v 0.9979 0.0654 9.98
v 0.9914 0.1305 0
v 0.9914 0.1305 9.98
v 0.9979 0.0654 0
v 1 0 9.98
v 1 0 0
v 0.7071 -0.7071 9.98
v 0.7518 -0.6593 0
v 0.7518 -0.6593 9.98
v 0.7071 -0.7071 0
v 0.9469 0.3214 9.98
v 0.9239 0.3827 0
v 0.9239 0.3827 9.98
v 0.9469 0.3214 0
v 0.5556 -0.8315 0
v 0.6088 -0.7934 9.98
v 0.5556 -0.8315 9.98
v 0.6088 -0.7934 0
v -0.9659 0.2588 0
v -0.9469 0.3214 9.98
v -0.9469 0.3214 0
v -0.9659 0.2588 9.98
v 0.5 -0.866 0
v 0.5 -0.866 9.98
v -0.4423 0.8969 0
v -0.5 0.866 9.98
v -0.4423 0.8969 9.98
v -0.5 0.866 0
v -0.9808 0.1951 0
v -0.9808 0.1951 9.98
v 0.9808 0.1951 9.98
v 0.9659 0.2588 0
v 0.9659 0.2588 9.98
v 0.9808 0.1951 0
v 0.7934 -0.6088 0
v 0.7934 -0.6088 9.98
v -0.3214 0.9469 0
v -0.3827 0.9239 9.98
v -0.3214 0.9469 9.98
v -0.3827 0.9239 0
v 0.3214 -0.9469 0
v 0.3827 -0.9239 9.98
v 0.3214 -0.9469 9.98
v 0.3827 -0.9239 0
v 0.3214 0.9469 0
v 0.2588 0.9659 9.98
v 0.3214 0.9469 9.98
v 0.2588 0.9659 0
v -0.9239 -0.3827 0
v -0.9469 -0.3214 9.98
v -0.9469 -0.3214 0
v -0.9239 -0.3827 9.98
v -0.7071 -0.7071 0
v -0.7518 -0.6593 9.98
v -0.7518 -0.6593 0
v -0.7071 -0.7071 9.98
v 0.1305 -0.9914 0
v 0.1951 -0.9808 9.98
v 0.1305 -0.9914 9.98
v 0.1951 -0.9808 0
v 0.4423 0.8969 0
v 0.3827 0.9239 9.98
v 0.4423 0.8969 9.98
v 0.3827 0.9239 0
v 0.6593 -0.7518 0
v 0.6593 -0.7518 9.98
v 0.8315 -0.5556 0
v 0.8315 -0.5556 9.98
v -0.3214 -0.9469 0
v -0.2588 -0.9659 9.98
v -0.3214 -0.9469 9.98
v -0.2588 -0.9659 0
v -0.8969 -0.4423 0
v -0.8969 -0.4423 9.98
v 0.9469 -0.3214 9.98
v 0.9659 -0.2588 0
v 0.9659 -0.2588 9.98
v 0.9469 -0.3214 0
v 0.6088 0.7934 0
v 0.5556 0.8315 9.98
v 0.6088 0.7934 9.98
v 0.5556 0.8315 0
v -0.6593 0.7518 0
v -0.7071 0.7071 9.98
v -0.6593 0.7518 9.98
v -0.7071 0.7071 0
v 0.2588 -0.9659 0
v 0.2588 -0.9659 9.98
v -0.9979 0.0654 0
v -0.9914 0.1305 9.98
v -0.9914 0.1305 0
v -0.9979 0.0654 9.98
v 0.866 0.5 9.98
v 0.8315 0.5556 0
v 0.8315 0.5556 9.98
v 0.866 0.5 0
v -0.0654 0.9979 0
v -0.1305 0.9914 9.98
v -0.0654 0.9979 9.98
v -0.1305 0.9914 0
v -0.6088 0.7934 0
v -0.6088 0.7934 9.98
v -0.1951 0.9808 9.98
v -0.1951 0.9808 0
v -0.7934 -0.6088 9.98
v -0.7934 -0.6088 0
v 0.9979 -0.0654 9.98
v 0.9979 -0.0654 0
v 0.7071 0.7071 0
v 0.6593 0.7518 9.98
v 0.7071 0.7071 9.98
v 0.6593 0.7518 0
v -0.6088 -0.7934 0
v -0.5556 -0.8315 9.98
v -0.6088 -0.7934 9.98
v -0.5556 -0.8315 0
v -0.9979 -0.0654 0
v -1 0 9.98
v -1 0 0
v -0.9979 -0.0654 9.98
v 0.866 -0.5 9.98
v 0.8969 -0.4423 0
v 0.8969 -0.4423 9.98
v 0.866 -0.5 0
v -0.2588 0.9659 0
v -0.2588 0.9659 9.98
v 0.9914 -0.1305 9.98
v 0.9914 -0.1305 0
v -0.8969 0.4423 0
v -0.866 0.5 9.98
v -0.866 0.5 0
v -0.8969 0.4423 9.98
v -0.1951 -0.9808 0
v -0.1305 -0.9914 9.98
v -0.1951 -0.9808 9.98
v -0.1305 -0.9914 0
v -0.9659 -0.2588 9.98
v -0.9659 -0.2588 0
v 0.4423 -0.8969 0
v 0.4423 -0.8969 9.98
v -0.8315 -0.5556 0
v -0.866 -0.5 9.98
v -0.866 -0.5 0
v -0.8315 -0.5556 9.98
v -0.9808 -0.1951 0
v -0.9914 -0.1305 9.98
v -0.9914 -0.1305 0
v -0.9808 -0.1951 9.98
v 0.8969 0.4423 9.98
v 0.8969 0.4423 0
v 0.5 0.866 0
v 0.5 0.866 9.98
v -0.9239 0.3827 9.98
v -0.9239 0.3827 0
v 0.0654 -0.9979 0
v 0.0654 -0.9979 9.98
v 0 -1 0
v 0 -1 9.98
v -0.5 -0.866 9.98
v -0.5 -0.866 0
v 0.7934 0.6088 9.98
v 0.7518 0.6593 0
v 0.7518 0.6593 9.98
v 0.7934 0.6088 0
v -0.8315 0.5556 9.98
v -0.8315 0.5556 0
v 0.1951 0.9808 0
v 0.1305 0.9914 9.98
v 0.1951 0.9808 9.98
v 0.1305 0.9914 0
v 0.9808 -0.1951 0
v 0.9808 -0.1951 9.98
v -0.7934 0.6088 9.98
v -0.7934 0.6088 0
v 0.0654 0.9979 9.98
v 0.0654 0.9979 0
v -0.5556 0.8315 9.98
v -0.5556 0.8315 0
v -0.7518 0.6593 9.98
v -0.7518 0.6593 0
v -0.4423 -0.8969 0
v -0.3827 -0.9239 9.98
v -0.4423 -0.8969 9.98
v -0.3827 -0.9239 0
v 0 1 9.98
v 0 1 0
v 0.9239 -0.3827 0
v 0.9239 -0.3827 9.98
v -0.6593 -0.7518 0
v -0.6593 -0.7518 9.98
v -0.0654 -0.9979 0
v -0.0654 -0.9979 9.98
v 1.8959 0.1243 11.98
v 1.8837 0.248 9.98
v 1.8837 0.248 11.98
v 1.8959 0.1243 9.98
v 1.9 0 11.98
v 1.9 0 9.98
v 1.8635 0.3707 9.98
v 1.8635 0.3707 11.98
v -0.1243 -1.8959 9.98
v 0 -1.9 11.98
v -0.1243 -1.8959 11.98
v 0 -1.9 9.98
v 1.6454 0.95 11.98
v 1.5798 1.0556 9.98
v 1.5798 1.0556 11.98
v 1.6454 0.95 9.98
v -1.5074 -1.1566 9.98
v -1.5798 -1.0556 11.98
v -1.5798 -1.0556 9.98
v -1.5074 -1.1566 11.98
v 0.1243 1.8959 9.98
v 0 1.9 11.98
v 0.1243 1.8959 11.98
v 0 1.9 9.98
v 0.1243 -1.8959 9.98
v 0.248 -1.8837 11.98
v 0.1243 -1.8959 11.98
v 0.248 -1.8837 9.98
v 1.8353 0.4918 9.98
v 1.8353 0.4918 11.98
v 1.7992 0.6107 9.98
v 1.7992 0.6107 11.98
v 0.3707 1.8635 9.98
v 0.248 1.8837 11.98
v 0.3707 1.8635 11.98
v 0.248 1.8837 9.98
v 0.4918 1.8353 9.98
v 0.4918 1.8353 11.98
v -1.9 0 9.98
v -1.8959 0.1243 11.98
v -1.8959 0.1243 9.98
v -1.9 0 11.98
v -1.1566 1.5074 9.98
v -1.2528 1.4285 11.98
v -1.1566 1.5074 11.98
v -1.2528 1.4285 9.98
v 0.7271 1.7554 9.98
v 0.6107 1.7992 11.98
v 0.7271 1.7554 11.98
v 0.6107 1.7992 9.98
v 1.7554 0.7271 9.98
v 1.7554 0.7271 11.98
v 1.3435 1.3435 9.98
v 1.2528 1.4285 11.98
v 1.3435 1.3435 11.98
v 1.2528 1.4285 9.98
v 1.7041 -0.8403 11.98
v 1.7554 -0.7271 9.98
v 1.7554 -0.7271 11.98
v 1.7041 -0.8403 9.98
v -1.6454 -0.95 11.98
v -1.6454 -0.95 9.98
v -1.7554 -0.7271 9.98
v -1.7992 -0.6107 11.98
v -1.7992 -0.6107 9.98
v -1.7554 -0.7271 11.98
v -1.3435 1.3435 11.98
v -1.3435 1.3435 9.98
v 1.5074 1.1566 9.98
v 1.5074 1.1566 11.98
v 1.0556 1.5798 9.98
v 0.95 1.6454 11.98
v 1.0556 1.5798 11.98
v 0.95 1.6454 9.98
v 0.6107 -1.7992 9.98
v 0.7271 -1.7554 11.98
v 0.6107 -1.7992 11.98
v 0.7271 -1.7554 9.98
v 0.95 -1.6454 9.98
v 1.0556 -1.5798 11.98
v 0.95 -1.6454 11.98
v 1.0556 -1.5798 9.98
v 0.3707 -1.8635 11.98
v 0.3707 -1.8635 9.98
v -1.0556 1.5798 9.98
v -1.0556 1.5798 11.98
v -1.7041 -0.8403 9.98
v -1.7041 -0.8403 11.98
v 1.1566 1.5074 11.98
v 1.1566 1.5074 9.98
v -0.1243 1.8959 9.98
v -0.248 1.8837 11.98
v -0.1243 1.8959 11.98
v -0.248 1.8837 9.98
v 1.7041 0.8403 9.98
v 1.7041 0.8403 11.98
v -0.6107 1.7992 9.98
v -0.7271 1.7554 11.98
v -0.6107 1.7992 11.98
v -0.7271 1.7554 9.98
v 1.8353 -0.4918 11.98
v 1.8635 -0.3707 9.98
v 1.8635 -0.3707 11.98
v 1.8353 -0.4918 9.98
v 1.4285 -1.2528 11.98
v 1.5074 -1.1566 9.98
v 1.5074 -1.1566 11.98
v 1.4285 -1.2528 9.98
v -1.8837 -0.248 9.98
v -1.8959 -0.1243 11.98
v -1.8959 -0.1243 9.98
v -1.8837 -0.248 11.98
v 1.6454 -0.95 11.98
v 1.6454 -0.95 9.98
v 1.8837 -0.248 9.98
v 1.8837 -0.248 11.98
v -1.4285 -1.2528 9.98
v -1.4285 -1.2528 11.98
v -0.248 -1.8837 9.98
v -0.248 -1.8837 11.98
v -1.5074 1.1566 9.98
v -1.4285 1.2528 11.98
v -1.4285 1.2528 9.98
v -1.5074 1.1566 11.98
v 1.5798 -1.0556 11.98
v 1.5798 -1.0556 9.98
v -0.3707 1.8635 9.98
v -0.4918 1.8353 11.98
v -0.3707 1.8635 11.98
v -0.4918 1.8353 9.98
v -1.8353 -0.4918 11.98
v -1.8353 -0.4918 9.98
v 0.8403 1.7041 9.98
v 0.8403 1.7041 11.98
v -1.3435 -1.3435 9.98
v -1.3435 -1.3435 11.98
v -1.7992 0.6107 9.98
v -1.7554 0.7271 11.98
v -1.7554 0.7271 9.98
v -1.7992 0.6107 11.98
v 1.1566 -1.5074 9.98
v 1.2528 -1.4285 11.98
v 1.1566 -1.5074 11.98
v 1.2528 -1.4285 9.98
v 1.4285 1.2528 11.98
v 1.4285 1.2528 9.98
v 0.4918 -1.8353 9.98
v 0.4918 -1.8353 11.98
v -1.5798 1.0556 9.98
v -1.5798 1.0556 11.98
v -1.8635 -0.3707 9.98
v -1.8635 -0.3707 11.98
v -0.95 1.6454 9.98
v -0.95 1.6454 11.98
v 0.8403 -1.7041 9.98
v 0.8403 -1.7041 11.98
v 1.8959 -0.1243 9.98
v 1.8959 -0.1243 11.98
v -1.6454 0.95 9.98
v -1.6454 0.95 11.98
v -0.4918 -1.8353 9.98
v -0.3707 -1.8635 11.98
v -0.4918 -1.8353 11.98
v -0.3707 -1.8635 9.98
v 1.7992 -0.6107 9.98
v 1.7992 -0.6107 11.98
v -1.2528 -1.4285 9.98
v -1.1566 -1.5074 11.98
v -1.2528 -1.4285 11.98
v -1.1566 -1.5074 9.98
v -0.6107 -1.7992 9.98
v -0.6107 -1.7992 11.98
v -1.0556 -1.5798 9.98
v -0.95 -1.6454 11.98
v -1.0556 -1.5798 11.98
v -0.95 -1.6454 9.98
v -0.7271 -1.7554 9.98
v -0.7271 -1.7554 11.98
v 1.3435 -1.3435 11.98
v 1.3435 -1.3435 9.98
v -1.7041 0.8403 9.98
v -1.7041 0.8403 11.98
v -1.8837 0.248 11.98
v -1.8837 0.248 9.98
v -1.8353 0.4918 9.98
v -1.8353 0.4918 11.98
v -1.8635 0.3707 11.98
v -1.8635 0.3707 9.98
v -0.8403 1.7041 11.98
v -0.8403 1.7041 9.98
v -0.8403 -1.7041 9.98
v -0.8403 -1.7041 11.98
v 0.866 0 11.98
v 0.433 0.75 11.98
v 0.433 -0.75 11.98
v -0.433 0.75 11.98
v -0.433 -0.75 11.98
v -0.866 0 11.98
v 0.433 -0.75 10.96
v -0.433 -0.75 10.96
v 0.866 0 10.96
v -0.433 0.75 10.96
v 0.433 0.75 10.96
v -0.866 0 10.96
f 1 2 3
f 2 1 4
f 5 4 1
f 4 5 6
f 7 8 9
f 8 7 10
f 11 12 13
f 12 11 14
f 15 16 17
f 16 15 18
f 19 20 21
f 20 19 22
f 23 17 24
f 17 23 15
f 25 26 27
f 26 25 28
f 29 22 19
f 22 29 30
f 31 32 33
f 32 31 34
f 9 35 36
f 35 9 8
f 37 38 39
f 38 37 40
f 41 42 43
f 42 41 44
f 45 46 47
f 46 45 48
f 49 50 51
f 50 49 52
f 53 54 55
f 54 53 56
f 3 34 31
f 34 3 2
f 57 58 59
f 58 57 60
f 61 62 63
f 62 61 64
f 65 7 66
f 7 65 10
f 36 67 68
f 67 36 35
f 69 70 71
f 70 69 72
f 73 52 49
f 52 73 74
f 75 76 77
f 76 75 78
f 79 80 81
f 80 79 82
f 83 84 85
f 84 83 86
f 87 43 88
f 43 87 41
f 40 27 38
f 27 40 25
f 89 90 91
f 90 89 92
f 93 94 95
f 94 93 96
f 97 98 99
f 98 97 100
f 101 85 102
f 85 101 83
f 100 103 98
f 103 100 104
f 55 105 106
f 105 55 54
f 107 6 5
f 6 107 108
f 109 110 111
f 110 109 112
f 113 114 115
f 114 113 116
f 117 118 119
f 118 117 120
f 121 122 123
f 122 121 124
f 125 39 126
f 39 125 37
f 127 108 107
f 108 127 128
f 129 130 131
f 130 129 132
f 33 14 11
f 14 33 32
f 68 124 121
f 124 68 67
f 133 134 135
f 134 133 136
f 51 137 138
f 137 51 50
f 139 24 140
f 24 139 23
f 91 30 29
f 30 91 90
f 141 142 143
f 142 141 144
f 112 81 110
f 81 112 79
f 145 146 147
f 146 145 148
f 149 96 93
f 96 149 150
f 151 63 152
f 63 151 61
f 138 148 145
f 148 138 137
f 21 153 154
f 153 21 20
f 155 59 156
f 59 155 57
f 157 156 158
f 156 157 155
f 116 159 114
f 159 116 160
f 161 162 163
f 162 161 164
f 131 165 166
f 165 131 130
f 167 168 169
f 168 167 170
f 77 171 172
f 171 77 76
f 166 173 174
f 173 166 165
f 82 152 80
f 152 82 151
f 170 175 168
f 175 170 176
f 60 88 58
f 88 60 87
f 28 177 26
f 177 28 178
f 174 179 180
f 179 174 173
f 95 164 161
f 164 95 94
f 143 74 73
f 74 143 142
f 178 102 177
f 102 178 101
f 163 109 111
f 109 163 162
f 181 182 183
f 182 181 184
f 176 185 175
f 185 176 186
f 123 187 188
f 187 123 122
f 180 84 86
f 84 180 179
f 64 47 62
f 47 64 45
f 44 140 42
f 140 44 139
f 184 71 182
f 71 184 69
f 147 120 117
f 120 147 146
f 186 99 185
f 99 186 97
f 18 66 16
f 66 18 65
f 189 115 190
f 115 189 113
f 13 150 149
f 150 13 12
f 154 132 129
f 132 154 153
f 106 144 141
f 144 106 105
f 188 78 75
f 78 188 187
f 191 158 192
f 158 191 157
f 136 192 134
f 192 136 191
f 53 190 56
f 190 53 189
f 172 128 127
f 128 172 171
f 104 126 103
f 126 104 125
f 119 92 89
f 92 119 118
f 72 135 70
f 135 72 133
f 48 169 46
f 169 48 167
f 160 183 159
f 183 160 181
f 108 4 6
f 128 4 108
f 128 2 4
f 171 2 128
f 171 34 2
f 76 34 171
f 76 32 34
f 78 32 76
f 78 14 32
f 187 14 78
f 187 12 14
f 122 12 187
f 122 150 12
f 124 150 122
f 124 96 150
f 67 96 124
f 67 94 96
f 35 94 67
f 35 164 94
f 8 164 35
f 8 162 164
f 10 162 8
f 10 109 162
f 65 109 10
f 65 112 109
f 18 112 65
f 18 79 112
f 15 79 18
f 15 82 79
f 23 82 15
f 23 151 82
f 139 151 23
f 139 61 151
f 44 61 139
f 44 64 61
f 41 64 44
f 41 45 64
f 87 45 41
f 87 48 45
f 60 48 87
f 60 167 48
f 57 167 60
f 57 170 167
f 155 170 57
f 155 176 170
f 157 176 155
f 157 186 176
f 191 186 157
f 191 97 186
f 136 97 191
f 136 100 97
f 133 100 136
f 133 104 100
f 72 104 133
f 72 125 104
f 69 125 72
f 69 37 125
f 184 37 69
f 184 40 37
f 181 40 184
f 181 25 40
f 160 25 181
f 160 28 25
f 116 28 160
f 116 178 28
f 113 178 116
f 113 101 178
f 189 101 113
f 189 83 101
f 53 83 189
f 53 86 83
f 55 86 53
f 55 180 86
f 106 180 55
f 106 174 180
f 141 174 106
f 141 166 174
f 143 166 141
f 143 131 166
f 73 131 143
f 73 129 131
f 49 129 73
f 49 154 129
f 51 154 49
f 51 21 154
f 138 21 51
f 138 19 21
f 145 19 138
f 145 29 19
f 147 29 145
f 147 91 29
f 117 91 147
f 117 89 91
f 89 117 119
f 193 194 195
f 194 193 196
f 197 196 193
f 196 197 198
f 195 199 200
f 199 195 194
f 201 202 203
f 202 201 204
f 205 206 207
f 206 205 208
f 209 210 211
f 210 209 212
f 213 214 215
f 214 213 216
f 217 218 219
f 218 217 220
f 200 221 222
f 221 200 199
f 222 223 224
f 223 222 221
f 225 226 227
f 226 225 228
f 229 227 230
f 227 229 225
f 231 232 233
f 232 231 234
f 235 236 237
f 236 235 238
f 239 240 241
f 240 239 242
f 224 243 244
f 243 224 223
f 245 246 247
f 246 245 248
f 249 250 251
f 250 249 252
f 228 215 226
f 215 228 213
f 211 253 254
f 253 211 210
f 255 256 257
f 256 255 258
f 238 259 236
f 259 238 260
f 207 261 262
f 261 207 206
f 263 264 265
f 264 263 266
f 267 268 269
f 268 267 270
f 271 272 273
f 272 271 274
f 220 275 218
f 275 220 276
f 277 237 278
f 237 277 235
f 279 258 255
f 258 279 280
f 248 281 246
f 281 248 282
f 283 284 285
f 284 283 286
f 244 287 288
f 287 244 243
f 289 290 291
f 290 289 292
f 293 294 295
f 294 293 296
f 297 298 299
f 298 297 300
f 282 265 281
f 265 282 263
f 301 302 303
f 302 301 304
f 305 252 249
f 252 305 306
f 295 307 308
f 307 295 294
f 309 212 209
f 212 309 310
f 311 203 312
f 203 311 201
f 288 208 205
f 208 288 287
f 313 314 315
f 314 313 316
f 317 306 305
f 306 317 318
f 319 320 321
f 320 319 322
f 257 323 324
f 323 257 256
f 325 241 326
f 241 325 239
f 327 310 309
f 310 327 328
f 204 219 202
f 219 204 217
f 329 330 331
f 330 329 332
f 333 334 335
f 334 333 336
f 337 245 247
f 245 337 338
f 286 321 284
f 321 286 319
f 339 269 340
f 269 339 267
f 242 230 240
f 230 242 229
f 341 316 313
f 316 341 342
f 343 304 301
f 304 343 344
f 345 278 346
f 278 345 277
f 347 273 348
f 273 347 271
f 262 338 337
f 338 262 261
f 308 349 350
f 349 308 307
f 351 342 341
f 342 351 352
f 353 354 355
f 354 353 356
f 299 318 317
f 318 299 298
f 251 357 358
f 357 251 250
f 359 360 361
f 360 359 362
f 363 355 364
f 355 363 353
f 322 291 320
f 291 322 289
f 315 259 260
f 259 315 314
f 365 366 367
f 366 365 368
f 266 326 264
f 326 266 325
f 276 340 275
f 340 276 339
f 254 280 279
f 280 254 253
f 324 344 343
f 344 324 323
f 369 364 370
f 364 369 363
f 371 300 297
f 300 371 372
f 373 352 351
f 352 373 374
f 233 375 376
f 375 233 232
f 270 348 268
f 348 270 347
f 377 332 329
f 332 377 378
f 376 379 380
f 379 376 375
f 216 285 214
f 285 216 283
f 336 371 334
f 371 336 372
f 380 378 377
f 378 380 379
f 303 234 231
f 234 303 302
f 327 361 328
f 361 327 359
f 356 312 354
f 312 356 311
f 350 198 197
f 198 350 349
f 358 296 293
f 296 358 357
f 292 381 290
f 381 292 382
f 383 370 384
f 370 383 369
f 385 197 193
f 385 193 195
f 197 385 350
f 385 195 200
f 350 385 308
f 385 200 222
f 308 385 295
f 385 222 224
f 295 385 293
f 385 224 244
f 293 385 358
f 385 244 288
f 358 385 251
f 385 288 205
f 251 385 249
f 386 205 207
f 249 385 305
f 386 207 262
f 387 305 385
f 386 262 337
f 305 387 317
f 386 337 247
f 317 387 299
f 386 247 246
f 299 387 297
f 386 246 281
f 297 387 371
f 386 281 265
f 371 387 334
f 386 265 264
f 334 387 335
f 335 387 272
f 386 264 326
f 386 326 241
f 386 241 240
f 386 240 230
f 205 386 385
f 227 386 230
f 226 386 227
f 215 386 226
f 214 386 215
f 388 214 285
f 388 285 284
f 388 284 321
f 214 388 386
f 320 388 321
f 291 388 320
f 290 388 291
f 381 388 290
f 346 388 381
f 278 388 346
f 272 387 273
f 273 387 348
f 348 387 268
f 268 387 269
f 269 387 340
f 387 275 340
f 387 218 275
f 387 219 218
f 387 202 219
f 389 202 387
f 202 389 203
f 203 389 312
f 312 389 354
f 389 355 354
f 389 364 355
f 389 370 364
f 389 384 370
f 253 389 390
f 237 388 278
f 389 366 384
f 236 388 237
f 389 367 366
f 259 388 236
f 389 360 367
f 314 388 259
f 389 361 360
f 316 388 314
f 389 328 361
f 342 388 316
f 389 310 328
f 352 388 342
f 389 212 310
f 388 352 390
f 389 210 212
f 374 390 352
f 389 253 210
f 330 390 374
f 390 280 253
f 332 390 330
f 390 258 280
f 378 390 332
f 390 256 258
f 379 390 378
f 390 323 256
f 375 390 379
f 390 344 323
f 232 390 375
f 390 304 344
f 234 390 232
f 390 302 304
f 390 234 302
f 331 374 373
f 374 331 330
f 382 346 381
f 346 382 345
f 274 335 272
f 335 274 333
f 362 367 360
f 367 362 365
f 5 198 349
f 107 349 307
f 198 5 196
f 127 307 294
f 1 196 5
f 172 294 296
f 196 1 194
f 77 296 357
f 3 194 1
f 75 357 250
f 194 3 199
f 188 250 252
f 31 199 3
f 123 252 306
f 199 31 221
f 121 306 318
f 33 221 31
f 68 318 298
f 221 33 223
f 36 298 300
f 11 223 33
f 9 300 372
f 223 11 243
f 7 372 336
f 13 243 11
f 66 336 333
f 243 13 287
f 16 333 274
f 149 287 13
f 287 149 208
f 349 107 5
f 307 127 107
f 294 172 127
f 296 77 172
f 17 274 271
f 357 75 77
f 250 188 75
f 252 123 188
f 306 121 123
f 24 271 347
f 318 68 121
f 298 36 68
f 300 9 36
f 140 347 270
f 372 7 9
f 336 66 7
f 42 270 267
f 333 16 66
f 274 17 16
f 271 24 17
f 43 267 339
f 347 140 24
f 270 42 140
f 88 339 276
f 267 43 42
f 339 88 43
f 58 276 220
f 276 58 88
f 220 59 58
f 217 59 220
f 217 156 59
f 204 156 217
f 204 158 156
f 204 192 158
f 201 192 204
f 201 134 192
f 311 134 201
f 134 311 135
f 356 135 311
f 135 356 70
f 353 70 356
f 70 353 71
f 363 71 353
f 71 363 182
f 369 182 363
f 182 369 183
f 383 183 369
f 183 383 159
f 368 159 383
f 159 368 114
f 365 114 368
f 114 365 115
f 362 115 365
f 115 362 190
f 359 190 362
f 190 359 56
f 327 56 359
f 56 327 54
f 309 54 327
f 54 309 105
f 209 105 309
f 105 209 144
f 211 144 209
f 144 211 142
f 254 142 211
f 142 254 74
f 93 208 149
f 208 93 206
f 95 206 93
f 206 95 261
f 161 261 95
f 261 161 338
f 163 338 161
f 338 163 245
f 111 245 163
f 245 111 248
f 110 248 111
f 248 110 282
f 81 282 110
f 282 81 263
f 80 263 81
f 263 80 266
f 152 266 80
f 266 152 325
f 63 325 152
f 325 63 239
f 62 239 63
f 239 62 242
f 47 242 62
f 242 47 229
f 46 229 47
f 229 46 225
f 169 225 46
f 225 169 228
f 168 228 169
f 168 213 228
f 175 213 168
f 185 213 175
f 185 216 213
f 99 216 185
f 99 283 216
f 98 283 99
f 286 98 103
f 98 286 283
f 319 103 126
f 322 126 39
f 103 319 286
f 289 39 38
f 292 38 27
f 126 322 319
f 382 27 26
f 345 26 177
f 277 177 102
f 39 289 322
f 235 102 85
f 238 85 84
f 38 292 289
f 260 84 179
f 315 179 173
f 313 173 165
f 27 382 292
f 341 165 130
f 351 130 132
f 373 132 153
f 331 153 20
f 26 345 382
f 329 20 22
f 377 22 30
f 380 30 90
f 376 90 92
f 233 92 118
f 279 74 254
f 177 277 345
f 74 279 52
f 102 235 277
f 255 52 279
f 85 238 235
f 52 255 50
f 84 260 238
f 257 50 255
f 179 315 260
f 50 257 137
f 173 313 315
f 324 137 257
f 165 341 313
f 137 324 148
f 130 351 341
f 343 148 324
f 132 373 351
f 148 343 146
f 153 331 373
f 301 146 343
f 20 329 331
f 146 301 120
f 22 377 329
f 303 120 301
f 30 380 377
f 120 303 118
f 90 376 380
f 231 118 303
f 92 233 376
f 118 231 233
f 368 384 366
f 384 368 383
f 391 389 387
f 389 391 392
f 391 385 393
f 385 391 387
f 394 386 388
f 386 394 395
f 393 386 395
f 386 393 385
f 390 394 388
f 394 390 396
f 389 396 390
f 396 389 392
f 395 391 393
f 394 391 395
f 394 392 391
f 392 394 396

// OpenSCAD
// Socket Head Cap Screw (single connected solid)
// Requested: shank Ø2.0mm, head Ø3.8mm, head height 2.0mm, length 10mm

$fn = 96;

// Parameters (mm)
shank_diameter_mm   = 2.0;
head_diameter_mm    = 3.8;
head_height_mm      = 2.0;
overall_length_mm   = 10.0;

// Hex socket (approx for this size)
hex_socket_af_mm    = 1.5;   // across flats
hex_socket_depth_mm = 1.0;

// Small edge details
head_top_chamfer_mm = 0.2;
tip_chamfer_mm      = 0.3;

// Robust boolean overlap
eps = 0.02;

module hex_prism(af, h, center=false) {
    // Regular hex with across-flats = af
    // For a regular hex: af = 2 * R * cos(30)  => R = af / (2*cos(30))
    R = af / (2*cos(30));
    cylinder(h=h, r=R, $fn=6, center=center);
}

module socket_head_cap_screw() {
    r_shank = shank_diameter_mm/2;
    r_head  = head_diameter_mm/2;

    // Place screw along +Z, with tip at Z=0 and head top at Z=overall_length+head_height
    difference() {
        union() {
            // Shank
            translate([0,0, overall_length_mm/2])
                cylinder(h=overall_length_mm, r=r_shank, center=true);

            // Tip chamfer (conical)
            translate([0,0, tip_chamfer_mm/2])
                cylinder(h=tip_chamfer_mm, r1=0, r2=r_shank, center=true);

            // Head (cylindrical)
            translate([0,0, overall_length_mm + head_height_mm/2 - eps])
                cylinder(h=head_height_mm, r=r_head, center=true);

            // Small top chamfer on head (frustum)
            translate([0,0, overall_length_mm + head_height_mm - head_top_chamfer_mm/2 - eps])
                cylinder(h=head_top_chamfer_mm, r1=r_head, r2=max(r_head - head_top_chamfer_mm, 0.01), center=true);
        }

        // Hex socket recess (subtracted)
        translate([0,0, overall_length_mm + head_height_mm - hex_socket_depth_mm/2 - eps])
            hex_prism(hex_socket_af_mm, hex_socket_depth_mm + 2*eps, center=true);
    }
}

socket_head_cap_screw();
